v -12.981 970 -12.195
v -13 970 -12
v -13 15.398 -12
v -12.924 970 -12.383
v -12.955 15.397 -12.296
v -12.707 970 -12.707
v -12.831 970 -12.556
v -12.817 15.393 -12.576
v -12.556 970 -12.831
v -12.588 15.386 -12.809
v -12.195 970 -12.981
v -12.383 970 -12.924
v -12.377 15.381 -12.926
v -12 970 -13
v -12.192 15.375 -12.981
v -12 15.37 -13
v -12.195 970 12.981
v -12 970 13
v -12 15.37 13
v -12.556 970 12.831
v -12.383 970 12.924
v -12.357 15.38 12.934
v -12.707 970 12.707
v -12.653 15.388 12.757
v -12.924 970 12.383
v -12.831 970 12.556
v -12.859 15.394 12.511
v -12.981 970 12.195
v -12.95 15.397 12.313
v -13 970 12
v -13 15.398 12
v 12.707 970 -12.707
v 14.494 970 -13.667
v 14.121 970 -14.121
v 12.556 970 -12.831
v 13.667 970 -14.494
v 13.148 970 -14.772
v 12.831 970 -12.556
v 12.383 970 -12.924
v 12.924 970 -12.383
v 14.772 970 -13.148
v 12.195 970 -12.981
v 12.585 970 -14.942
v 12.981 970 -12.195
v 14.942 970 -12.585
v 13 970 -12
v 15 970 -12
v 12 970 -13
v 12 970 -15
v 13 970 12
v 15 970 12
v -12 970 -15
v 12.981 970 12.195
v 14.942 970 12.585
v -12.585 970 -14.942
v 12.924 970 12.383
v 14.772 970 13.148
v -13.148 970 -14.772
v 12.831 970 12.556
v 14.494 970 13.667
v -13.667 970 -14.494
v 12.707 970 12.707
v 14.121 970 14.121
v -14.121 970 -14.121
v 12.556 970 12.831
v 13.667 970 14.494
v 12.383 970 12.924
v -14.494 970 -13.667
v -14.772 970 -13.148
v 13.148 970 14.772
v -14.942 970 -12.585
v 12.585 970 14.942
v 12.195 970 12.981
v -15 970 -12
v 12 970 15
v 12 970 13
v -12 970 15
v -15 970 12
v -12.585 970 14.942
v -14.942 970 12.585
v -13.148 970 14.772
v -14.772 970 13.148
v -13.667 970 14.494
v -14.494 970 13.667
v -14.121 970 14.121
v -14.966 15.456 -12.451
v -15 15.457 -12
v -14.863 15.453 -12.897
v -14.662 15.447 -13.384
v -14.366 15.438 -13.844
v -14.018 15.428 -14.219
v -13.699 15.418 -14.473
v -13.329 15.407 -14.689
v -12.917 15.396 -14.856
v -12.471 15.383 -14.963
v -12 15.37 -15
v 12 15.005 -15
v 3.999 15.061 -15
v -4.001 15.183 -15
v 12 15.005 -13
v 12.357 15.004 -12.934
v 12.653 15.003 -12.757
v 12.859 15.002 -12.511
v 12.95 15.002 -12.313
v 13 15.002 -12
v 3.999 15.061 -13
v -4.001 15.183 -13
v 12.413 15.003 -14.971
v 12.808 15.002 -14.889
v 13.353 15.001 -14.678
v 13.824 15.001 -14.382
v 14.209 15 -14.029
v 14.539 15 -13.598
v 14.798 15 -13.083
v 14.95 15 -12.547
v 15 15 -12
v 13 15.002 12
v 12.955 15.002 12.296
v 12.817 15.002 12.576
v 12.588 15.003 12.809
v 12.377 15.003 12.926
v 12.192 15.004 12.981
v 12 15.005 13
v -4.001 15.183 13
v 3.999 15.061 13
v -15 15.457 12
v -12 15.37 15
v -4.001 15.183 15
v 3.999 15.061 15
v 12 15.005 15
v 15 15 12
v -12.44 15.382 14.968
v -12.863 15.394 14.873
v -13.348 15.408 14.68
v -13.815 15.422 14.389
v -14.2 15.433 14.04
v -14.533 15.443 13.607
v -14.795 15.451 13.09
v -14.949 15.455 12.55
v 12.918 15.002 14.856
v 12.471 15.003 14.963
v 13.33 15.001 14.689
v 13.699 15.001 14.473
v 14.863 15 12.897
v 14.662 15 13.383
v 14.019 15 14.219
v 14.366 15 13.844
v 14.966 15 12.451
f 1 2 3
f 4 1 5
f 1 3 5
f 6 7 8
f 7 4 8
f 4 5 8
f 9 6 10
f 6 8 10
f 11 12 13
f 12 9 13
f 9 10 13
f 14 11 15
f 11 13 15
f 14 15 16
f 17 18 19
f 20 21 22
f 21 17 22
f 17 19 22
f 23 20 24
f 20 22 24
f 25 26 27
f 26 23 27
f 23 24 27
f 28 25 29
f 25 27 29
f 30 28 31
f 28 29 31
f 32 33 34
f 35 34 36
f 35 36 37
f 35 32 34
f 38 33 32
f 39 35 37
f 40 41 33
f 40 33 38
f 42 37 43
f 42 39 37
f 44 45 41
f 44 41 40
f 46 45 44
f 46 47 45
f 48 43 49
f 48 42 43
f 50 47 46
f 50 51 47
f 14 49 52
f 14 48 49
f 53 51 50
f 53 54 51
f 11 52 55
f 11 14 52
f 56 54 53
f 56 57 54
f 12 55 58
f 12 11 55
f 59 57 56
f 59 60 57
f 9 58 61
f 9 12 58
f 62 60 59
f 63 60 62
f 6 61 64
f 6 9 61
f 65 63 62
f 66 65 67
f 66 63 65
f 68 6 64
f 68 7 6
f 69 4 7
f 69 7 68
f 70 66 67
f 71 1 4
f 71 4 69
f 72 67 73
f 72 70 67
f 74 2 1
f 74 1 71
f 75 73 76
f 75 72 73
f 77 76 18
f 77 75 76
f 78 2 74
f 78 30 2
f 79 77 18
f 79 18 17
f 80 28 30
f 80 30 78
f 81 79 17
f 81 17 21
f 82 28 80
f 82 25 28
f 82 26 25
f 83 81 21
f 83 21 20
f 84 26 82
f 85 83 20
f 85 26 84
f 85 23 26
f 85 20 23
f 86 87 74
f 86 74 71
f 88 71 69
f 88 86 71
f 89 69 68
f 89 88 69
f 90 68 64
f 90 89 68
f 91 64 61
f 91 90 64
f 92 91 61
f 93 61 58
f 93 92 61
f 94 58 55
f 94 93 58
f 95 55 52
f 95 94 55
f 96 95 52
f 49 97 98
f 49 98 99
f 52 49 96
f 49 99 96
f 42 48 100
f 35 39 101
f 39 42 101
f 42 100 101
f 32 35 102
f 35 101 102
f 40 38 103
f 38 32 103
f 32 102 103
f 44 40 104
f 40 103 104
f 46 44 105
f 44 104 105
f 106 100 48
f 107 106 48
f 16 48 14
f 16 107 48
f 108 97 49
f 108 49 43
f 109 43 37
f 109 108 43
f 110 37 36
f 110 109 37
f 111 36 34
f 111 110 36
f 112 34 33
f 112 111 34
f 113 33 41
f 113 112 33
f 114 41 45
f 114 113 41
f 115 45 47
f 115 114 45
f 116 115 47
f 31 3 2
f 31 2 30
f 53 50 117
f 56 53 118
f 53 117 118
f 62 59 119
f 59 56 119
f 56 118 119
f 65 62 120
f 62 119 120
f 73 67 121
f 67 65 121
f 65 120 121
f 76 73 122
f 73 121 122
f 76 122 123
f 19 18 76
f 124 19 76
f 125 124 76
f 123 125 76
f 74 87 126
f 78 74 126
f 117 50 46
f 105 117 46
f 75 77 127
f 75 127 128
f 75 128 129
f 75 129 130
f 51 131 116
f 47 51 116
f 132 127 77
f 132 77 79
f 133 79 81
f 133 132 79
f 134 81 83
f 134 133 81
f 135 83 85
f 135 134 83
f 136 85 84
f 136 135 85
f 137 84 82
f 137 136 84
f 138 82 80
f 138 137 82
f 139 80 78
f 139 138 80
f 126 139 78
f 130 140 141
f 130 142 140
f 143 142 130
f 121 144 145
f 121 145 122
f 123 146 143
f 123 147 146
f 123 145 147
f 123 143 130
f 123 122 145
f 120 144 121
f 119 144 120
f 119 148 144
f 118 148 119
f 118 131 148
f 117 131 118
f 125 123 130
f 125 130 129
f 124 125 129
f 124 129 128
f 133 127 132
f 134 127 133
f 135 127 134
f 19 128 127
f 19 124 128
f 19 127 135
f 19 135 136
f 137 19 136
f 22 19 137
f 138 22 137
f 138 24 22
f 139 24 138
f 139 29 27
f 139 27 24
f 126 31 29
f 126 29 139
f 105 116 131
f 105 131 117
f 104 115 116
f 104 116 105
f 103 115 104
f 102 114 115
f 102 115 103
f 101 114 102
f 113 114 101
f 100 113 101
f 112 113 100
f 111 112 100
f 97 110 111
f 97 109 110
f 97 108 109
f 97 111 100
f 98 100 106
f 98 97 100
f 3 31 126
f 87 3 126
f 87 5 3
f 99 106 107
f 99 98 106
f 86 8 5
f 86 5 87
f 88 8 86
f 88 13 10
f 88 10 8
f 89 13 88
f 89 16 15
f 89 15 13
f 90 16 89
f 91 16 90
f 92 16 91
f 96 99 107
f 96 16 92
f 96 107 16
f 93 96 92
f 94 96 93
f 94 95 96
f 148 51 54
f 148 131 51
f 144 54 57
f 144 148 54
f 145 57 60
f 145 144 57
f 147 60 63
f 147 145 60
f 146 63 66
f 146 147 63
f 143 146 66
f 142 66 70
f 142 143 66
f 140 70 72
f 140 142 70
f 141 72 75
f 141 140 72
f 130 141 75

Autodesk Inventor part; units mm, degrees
ref_plane "YZ Plane" through (0, 0, 0) normal (1, 0, 0) x (0, 1, 0)
ref_plane "XZ Plane" through (0, 0, 0) normal (0, 1, 0) x (-1, 0, 0)
sketch "Sketch1" plane through (0, 0, 0) normal (0, 1, 0) x (-1, 0, 0)
  line L0 (-12, 14) -> (12, 14) construction
  line L1 (14, 12) -> (14, -12) construction
  line L2 (12, -14) -> (-12, -14) construction
  line L3 (-14, -12) -> (-14, 12) construction
  line L4 (-14, 14) -> (14, -14) construction
  line L5 (14, 14) -> (-14, -14) construction
  arc A0 (14, 12) -> (12, 14) centre (12, 12) ccw construction
  arc A1 (12, -14) -> (14, -12) centre (12, -12) ccw construction
  arc A2 (-14, -12) -> (-12, -14) centre (-12, -12) ccw construction
  arc A3 (-12, 14) -> (-14, 12) centre (-12, 12) ccw construction
  line L6 (-12, -15) -> (12, -15)
  arc A4 (12, -15) -> (15, -12) centre (12, -12) ccw
  line L7 (15, -12) -> (15, 12)
  arc A5 (15, 12) -> (12, 15) centre (12, 12) ccw
  line L8 (12, 15) -> (-12, 15)
  arc A6 (-12, 15) -> (-15, 12) centre (-12, 12) ccw
  line L9 (-15, 12) -> (-15, -12)
  arc A7 (-15, -12) -> (-12, -15) centre (-12, -12) ccw
  line L10 (13, -12) -> (13, 12)
  arc A8 (13, 12) -> (12, 13) centre (12, 12) ccw
  line L11 (12, 13) -> (-12, 13)
  arc A9 (-12, 13) -> (-13, 12) centre (-12, 12) ccw
  line L12 (-13, 12) -> (-13, -12)
  arc A10 (-13, -12) -> (-12, -13) centre (-12, -12) ccw
  line L13 (-12, -13) -> (12, -13)
  arc A11 (12, -13) -> (13, -12) centre (12, -12) ccw
  point P0 (0, 0)
  point P1 (0, 0)
  point P2 (0, 0)
  dimension "d10" = 2
  dimension "depth" = 30
  dimension "width" = 30
  dimension "thickness" = 2
extrude "Extrusion1" add sketch "Sketch1" along normal blind 970
ref_plane "Work Plane1" through (0, 485, 0) normal (0, -1, 0) x (1, 0, 0)
sketch "Sketch3" plane through (12, 0, -15) normal (0, 0, -1) x (-1, 0, 0)
  line L0 (12, -397) -> (12, 2382) construction
  circle A0 centre (-3, 1000) radius 985
  point P0 (12, 0)
  dimension "d29" = 1970
  dimension "d31" = 1000
  dimension "d34" = 15
extrude "Extrusion2" cut sketch "Sketch3" against normal through all keep common part
equation "\"d10\" = thickness"
properties part number "podest duzy profil 2" material "Steel"
